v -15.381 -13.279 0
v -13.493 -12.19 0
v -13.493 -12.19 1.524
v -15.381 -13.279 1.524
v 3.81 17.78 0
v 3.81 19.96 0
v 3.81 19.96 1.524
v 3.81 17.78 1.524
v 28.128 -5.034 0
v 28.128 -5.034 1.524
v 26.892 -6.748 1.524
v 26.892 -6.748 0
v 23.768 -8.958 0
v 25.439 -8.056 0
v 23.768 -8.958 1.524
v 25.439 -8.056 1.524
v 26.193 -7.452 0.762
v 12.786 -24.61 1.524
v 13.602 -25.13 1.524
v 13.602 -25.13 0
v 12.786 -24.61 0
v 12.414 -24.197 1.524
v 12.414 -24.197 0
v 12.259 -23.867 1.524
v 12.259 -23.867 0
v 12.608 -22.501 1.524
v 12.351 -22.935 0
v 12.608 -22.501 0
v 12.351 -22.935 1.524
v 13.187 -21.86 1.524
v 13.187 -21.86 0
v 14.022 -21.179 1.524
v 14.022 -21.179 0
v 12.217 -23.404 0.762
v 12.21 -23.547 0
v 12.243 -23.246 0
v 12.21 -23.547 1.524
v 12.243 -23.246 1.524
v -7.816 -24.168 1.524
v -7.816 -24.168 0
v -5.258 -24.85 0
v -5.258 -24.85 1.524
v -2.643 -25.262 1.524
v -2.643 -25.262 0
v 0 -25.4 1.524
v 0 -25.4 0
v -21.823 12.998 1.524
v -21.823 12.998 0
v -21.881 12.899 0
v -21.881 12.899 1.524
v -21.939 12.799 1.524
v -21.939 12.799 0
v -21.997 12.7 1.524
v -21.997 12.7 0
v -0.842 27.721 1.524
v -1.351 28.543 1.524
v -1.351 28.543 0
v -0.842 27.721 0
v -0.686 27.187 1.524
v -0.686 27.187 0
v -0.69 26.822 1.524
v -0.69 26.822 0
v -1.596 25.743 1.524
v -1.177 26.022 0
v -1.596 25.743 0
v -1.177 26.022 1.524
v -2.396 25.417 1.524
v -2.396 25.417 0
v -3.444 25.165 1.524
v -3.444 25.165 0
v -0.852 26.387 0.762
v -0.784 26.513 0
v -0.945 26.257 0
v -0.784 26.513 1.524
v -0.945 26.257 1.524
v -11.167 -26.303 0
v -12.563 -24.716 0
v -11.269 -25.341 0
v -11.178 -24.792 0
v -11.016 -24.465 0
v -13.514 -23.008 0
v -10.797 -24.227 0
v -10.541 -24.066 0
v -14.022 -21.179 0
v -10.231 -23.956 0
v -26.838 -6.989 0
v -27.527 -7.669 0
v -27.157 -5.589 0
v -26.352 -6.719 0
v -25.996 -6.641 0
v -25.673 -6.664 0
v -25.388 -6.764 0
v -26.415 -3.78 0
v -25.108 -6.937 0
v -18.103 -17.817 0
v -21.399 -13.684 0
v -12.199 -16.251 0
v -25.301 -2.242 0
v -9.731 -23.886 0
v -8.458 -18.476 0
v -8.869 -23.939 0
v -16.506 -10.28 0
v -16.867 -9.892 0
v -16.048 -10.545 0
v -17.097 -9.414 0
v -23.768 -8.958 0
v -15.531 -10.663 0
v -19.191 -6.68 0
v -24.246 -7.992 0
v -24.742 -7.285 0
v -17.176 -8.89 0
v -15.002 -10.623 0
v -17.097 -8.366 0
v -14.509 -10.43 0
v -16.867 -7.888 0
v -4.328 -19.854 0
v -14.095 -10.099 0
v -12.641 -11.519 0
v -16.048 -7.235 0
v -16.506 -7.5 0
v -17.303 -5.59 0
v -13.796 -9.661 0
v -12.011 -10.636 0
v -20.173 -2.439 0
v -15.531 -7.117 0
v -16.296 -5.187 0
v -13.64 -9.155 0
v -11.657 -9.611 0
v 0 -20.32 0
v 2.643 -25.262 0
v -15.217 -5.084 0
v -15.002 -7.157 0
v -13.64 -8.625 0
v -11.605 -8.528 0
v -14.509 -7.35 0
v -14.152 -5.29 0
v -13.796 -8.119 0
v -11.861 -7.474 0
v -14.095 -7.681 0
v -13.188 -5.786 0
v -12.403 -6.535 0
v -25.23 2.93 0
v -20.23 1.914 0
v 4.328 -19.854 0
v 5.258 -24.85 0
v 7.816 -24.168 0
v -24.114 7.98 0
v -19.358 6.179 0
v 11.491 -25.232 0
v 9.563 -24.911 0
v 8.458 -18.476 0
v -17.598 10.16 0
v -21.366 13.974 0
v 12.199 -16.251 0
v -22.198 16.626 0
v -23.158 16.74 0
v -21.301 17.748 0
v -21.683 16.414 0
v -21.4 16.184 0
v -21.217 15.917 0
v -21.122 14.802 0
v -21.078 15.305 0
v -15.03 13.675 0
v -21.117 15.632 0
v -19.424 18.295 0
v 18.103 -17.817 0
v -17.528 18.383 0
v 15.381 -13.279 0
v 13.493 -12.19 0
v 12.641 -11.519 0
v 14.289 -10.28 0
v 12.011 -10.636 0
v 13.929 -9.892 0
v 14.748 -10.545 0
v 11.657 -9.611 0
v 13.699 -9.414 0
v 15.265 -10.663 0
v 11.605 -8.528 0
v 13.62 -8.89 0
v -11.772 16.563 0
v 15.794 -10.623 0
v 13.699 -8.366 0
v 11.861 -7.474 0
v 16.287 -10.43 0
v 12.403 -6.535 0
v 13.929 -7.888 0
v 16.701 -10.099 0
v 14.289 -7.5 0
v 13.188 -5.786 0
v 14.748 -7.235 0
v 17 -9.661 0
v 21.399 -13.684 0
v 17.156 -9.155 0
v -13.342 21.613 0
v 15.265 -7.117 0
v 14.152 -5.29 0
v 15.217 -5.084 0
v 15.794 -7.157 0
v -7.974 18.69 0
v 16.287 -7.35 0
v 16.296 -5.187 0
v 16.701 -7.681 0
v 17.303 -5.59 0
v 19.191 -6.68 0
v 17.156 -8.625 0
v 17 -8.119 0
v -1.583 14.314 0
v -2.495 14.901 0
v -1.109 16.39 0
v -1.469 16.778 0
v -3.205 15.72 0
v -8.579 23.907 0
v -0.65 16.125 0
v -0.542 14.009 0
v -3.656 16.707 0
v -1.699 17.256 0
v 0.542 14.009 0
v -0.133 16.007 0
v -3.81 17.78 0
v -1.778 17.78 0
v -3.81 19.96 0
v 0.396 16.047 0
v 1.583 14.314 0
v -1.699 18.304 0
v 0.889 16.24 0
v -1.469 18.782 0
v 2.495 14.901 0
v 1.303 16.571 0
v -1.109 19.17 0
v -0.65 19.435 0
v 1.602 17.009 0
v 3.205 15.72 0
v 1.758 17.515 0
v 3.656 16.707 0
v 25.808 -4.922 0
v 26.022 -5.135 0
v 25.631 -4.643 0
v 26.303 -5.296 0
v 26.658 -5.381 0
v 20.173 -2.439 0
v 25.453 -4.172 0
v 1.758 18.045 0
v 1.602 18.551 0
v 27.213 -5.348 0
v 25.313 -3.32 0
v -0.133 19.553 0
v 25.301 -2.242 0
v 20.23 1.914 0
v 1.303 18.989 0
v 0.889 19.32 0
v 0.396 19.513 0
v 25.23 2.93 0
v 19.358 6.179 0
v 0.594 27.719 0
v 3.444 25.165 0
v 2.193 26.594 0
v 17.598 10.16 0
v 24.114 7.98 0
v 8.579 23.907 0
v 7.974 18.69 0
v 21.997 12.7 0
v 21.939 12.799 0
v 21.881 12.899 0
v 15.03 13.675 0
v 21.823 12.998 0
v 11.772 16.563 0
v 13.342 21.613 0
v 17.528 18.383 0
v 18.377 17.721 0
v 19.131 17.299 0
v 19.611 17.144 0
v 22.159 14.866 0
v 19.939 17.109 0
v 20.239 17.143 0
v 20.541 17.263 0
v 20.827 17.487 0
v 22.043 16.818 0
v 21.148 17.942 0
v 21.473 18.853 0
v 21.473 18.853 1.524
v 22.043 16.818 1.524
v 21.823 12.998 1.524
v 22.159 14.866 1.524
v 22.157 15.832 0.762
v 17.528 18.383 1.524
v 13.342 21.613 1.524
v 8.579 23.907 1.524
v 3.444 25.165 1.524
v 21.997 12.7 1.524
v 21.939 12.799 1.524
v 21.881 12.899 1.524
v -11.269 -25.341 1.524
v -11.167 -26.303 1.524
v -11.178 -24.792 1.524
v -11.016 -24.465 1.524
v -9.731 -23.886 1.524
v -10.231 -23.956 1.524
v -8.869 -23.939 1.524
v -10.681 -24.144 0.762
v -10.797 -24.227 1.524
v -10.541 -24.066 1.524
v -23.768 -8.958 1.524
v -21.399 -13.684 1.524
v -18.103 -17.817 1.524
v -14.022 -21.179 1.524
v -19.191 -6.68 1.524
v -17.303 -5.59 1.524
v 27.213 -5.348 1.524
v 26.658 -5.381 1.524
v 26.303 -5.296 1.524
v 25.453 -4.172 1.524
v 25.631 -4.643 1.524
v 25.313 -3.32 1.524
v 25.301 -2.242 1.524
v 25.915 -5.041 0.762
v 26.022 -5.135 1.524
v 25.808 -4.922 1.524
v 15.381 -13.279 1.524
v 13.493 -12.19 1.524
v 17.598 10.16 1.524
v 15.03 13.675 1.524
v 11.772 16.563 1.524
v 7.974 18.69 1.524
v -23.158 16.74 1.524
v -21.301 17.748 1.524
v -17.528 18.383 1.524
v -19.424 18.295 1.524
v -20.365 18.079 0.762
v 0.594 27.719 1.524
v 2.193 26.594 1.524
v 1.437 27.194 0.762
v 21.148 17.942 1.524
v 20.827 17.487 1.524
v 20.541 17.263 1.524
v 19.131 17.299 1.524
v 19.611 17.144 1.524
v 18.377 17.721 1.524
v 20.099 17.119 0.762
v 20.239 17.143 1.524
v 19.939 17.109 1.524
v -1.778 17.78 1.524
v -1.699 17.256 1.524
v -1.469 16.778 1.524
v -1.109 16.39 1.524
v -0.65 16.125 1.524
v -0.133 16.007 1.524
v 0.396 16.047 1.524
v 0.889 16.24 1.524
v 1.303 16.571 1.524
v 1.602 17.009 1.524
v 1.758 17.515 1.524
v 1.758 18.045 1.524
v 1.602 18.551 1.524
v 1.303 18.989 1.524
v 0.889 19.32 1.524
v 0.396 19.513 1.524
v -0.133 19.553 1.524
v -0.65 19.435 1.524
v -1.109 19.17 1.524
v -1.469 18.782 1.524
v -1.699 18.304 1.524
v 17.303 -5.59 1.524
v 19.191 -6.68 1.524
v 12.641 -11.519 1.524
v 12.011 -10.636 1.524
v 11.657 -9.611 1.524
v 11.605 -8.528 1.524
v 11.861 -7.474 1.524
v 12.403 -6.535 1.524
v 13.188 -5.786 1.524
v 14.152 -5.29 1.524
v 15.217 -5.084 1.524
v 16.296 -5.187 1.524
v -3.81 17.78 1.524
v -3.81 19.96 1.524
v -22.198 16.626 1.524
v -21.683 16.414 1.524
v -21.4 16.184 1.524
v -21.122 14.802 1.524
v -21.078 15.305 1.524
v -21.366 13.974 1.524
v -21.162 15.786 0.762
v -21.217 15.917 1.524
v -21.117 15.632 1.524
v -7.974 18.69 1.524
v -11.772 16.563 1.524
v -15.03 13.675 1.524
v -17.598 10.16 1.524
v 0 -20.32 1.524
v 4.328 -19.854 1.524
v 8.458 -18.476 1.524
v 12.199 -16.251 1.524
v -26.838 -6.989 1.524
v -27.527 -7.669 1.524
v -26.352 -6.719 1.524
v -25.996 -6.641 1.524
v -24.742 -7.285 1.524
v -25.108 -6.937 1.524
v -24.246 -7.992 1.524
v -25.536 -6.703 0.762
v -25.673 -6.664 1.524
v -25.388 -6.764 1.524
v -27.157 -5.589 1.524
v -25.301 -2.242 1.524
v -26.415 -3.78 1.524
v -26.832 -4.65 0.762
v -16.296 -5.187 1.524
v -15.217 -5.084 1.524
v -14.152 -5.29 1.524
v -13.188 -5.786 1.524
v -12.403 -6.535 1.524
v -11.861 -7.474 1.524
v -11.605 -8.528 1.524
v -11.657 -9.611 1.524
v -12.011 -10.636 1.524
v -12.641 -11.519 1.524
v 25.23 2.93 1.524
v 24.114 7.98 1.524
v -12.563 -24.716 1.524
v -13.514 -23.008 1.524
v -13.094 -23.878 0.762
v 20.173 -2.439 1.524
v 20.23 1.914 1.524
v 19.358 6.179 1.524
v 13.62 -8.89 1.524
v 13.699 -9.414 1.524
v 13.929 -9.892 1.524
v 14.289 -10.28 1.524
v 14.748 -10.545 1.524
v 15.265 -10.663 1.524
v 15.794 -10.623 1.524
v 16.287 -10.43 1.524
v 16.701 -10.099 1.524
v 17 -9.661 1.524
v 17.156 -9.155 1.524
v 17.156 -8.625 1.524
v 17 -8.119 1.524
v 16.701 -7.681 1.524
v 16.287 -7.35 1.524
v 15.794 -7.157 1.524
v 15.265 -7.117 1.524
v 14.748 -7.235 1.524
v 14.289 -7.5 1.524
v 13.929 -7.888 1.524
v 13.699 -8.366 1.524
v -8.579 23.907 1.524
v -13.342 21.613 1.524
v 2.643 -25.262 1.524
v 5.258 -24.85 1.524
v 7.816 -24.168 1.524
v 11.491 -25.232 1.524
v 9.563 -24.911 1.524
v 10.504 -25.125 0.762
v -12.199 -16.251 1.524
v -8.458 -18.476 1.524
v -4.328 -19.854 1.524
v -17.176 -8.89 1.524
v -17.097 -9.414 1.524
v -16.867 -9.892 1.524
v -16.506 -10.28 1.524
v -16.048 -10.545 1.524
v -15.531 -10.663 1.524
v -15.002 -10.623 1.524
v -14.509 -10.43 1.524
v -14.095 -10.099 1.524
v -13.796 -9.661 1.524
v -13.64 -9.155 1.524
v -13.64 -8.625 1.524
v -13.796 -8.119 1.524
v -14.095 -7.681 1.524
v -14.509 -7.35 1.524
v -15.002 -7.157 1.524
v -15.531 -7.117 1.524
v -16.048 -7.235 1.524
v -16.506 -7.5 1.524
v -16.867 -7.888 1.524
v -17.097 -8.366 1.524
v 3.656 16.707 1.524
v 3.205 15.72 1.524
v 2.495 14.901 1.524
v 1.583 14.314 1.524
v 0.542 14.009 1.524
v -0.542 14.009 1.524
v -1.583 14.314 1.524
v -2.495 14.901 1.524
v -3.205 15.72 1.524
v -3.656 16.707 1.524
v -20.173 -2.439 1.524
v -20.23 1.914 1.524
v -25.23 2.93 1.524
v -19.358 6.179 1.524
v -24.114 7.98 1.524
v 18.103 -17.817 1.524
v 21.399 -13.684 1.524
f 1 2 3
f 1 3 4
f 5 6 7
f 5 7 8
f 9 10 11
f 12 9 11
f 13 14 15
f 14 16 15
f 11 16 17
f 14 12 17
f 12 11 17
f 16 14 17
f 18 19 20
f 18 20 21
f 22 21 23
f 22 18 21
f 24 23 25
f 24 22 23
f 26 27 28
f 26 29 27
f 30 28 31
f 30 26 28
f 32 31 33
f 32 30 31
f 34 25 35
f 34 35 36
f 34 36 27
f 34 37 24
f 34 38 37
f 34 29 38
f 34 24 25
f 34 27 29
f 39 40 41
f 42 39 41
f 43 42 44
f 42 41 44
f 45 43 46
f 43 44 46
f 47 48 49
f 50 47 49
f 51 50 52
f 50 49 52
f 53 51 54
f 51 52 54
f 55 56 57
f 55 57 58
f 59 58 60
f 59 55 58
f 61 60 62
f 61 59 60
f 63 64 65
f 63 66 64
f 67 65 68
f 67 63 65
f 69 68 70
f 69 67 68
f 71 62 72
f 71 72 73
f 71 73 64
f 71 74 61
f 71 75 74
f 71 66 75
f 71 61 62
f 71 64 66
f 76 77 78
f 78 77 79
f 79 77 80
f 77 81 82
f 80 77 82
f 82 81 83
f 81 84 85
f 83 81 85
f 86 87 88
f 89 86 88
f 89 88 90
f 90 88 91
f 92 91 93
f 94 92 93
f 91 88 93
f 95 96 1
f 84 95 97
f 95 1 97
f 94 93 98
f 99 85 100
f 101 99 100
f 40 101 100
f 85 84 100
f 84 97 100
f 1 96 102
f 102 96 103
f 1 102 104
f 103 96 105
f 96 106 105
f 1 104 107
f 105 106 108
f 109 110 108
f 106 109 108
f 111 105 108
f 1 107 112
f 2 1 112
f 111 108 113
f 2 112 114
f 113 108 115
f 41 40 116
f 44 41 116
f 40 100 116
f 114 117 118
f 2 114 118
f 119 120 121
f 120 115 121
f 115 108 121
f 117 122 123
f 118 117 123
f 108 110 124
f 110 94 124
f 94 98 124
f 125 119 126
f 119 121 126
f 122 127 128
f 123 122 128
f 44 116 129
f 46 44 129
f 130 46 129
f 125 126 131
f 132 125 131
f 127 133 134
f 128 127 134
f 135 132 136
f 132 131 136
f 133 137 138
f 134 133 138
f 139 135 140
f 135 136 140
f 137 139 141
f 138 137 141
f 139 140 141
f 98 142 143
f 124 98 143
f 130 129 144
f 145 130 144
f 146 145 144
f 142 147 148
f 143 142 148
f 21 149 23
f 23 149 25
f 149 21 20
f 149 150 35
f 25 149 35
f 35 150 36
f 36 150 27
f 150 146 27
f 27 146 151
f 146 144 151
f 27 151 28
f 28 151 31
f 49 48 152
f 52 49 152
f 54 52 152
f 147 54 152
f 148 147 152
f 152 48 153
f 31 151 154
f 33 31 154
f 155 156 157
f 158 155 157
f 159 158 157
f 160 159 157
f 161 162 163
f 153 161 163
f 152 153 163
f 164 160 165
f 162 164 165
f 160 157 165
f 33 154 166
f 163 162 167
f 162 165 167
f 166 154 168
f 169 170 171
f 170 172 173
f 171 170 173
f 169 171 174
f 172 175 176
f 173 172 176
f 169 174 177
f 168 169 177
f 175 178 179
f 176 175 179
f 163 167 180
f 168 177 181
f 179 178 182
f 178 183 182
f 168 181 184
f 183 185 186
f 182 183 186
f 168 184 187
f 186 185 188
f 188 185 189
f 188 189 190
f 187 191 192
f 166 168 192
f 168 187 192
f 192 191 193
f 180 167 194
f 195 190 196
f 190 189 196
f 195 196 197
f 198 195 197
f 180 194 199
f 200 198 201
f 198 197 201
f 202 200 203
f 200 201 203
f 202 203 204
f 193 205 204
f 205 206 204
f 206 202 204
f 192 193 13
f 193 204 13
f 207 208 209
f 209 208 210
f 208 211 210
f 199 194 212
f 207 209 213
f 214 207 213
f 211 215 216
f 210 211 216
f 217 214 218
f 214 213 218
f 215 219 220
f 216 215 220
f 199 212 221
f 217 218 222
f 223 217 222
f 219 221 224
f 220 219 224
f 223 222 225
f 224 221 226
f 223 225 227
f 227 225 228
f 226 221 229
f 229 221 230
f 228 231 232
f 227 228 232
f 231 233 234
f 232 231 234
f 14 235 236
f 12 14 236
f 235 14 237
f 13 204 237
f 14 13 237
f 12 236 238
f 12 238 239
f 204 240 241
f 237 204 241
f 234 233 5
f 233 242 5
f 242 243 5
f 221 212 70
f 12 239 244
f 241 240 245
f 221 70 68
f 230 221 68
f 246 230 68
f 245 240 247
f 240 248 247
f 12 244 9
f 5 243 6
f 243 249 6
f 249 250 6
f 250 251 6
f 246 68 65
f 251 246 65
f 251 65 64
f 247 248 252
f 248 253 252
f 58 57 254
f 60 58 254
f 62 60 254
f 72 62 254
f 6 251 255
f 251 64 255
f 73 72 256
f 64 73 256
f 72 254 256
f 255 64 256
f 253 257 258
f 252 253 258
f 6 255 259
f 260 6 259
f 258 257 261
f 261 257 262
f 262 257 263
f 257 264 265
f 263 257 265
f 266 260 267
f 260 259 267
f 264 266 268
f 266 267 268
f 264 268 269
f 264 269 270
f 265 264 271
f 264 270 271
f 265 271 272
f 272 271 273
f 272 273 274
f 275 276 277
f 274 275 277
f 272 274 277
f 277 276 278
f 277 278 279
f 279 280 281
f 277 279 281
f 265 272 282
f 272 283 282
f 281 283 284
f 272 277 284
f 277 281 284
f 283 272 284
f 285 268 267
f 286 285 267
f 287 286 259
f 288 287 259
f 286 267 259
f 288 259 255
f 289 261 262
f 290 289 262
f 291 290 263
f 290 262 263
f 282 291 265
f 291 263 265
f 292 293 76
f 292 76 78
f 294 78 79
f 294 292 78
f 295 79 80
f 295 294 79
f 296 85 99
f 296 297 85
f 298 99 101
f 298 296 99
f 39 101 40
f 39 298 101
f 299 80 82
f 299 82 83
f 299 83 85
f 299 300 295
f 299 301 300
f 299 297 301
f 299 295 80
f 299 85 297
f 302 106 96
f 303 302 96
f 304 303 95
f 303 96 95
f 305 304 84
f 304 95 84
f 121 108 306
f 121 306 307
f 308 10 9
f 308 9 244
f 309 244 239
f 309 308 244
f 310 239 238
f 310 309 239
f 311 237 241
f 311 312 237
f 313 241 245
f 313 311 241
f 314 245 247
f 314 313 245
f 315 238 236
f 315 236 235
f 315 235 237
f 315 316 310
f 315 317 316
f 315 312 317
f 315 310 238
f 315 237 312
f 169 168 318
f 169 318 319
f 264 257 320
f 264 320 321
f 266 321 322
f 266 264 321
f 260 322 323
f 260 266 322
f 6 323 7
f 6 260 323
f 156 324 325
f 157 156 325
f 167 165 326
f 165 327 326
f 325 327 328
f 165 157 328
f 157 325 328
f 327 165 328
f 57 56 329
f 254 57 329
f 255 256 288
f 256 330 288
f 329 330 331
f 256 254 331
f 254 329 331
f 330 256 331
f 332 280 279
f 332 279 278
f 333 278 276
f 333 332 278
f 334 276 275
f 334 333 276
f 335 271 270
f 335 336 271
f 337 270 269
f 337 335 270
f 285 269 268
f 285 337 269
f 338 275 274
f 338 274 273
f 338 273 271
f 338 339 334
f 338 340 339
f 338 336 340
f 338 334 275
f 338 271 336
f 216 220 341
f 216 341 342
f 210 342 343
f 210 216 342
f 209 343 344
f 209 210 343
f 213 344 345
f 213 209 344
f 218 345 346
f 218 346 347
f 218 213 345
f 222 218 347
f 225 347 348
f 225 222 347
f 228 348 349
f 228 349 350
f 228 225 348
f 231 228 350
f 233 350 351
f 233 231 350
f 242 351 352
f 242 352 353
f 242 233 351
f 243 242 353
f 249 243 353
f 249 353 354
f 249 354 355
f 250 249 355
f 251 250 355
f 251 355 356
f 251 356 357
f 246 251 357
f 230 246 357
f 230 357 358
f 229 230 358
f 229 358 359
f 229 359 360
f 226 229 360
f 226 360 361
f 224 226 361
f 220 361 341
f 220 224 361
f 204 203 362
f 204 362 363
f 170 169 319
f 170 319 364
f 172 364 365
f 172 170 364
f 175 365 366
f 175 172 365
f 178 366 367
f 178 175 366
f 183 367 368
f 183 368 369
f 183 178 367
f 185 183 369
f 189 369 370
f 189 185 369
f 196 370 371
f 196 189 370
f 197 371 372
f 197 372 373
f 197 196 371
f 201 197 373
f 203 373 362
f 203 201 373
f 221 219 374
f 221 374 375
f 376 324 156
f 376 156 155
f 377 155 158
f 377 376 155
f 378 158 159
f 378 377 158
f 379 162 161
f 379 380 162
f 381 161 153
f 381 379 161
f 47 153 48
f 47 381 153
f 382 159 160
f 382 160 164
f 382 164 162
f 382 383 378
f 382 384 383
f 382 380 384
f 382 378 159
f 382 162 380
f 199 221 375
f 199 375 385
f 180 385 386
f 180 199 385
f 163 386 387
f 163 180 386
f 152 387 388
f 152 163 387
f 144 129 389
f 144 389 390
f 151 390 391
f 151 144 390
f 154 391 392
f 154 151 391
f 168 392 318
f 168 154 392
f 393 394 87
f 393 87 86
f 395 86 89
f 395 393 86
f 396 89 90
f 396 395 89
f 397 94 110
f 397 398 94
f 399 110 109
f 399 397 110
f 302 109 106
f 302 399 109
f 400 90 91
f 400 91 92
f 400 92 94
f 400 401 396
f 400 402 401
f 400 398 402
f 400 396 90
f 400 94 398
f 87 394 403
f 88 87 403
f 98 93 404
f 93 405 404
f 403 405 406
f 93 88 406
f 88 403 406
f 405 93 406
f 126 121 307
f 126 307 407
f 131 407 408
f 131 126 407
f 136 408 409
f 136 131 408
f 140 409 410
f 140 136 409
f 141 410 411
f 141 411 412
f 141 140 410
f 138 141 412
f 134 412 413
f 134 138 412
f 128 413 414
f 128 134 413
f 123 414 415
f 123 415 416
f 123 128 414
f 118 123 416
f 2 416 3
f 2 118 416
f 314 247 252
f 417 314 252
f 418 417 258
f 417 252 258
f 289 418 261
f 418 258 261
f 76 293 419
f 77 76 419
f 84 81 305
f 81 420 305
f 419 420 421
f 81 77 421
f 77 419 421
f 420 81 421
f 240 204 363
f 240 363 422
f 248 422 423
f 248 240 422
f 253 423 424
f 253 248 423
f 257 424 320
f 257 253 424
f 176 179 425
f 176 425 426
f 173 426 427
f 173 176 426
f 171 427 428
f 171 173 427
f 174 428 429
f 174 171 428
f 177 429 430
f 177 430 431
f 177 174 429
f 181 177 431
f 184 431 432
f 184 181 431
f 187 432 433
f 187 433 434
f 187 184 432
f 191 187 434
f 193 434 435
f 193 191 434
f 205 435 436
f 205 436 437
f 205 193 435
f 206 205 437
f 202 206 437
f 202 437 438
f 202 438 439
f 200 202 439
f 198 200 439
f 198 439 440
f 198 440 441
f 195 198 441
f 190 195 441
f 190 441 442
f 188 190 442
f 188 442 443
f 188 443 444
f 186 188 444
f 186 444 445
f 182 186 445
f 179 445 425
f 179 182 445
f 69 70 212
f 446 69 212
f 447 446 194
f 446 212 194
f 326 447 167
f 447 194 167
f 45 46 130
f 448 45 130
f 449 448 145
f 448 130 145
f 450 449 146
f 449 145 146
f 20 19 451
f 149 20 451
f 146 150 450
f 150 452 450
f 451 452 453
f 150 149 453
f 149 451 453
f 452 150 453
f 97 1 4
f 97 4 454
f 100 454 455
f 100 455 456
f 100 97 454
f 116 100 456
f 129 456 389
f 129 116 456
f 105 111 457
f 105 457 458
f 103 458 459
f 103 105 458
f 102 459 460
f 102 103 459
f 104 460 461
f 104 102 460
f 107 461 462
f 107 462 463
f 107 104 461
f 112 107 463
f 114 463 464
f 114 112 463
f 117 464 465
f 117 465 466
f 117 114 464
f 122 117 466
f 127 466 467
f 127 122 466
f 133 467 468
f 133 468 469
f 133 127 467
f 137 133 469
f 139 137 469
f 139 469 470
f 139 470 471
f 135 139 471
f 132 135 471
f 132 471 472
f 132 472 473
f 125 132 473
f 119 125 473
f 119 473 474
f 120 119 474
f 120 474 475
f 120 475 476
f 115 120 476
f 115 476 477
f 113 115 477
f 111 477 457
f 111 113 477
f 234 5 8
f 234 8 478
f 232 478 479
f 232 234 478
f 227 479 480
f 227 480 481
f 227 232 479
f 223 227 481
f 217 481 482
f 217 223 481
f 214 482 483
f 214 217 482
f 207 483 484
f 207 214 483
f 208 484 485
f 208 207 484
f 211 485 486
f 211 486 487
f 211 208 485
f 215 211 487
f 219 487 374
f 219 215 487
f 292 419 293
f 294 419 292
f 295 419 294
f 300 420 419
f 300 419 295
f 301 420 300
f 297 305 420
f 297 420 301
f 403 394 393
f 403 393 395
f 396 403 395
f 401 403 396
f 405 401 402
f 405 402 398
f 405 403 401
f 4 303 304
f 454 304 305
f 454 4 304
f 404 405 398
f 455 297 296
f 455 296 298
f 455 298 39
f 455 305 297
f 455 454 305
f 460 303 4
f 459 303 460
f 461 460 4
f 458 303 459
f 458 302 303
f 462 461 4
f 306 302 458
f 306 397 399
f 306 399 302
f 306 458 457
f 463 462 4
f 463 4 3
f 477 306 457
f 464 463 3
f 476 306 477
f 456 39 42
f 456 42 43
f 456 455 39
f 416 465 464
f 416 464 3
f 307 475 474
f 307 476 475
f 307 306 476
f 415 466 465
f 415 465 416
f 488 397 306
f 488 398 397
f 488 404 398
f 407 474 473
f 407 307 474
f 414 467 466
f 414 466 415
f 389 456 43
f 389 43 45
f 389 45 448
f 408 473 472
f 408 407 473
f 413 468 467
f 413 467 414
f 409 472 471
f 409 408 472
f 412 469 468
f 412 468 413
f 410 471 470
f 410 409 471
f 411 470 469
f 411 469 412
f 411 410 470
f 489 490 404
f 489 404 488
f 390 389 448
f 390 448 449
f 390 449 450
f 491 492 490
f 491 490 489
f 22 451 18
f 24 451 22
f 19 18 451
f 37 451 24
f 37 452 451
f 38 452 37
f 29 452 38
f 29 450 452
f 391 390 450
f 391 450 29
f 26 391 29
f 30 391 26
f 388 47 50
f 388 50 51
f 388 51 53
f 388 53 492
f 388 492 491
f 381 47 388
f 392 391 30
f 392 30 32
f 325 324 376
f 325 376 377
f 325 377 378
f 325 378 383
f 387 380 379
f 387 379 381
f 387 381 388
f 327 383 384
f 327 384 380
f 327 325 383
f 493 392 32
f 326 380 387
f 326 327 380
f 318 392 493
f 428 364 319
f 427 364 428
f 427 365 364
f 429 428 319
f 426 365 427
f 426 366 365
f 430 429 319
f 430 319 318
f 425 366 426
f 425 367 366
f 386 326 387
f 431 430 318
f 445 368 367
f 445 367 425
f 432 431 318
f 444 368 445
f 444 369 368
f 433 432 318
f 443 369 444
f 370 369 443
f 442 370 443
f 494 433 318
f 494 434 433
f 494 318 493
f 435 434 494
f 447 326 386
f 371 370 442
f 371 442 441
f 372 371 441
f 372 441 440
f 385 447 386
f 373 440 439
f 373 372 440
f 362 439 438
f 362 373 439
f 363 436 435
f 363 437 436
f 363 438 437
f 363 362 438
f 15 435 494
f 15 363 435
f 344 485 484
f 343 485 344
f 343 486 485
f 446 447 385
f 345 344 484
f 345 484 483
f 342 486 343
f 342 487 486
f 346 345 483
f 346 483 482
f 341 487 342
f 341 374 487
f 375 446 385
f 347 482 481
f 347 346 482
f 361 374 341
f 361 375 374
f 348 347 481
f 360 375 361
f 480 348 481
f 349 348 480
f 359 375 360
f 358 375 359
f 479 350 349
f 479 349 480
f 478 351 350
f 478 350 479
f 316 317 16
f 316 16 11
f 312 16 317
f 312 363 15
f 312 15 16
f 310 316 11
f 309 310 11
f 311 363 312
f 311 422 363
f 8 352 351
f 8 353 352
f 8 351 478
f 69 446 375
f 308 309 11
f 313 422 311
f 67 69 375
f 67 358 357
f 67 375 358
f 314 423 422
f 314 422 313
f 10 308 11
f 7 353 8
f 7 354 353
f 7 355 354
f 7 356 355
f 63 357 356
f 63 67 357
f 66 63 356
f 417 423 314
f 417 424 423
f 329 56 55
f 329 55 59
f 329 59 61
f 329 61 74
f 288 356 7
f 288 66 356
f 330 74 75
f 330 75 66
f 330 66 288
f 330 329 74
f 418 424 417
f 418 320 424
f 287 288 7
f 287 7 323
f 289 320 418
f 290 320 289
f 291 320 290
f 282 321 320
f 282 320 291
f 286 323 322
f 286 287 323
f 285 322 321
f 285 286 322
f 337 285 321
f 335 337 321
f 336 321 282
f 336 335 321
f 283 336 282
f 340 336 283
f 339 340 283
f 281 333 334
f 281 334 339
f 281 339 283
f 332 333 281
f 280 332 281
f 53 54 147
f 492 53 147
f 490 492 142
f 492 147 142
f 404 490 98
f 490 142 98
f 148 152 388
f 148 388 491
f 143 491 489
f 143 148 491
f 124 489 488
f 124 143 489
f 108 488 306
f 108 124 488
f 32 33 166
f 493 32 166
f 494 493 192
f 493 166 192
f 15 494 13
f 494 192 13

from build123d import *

# Parameters (mm, degrees)
SKETCH1_R           = 1.778
BOSS_EXTRUDE1_DEPTH = 1.524
BOSS_EXTRUDE2_DEPTH = 1.524


with BuildPart() as part:
    # Sketch1 → Boss-Extrude1 (new body)
    with BuildSketch(Plane.XY):
        with BuildLine():
            ThreePointArc((21.997045256, 12.7), (0, 25.4), (-21.997045256, 12.7))
            ThreePointArc((-21.997045256, 12.7), (-21.997045256, -12.7), (0, -25.4))
            ThreePointArc((0, -25.4), (21.997045256, -12.7), (21.997045256, 12.7))
        make_face()
        with Locations(Location((0, 17.78, 0), (0, 0, 180))):
            Circle(SKETCH1_R, mode=Mode.SUBTRACT)
        with Locations(Location((15.397931679, -8.89, 0), (0, 0, 180))):
            Circle(SKETCH1_R, mode=Mode.SUBTRACT)
        with Locations(Location((-15.397931679, -8.89, 0), (0, 0, 180))):
            Circle(SKETCH1_R, mode=Mode.SUBTRACT)
        with BuildLine():
            Line((-3.81, 17.78), (-3.81, 19.95961673))
            ThreePointArc((-3.81, 19.95961673), (-11.771994053, 16.562685652), (-17.597636205, 10.16))
            ThreePointArc((-17.597636205, 10.16), (-20.229703556, 1.913503077), (-19.190535138, -6.680251576))
            Line((-19.190535138, -6.680251576), (-17.302931679, -5.590443212))
            ThreePointArc((-17.302931679, -5.590443212), (-12.098374891, -6.985), (-13.492931679, -12.189556788))
            Line((-13.492931679, -12.189556788), (-15.380535138, -13.279365153))
            ThreePointArc((-15.380535138, -13.279365153), (-8.457709503, -18.476188729), (0, -20.32))
            ThreePointArc((0, -20.32), (8.457709503, -18.476188729), (15.380535138, -13.279365153))
            Line((15.380535138, -13.279365153), (13.492931679, -12.189556788))
            ThreePointArc((13.492931679, -12.189556788), (12.098374891, -6.985), (17.302931679, -5.590443212))
            Line((17.302931679, -5.590443212), (19.190535138, -6.680251576))
            ThreePointArc((19.190535138, -6.680251576), (20.229703556, 1.913503077), (17.597636205, 10.16))
            ThreePointArc((17.597636205, 10.16), (11.771994053, 16.562685652), (3.81, 19.95961673))
            Line((3.81, 19.95961673), (3.81, 17.78))
            ThreePointArc((3.81, 17.78), (0, 13.97), (-3.81, 17.78))
        make_face(mode=Mode.SUBTRACT)
    extrude(amount=BOSS_EXTRUDE1_DEPTH)

    # Sketch2 → Boss-Extrude2 (add)
    with BuildSketch(Plane.XY.offset(1.524)):
        with BuildLine():
            Line((-3.444175737, 25.165405888), (4.388245609, 23.329352482))
            add(Edge.make_bspline(
                [(-1.351467981, 28.543022953), (2.94701041, 27.179254576), (4.388245609, 23.329352482)],
                knots=[0, 0, 0, 1, 1, 1], degree=2))
            add(Edge.make_bspline(
                [(-1.351467981, 28.543022953), (0.693484877, 25.920519128), (-3.444175737, 25.165405888)],
                knots=[0, 0, 0, 1, 1, 1], degree=2))
        make_face()
        with BuildLine():
            Line((17.527698145, 18.383138953), (20.975648621, 11.114744787))
            add(Edge.make_bspline(
                [(21.473207446, 18.852903941), (23.087027834, 14.641922533), (20.975648621, 11.114744787)],
                knots=[0, 0, 0, 1, 1, 1], degree=2))
            add(Edge.make_bspline(
                [(21.473207446, 18.852903941), (20.697858644, 15.618991025), (17.527698145, 18.383138953)],
                knots=[0, 0, 0, 1, 1, 1], degree=2))
        make_face()
        with BuildLine():
            Line((25.300857823, -2.242006562), (21.767960397, -9.469492432))
            add(Edge.make_bspline(
                [(28.128119692, -5.033836268), (25.84204241, -8.921075819), (21.767960397, -9.469492432)],
                knots=[0, 0, 0, 1, 1, 1], degree=2))
            add(Edge.make_bspline(
                [(28.128119692, -5.033836268), (25.116322693, -6.443955888), (25.300857823, -2.242006562)],
                knots=[0, 0, 0, 1, 1, 1], degree=2))
        make_face()
        with BuildLine():
            Line((14.021955517, -21.178875406), (6.168554008, -22.923008708))
            add(Edge.make_bspline(
                [(13.601984102, -25.129995095), (9.137471969, -25.766322122), (6.168554008, -22.923008708)],
                knots=[0, 0, 0, 1, 1, 1], degree=2))
            add(Edge.make_bspline(
                [(13.601984102, -25.129995095), (10.621683474, -23.654472585), (14.021955517, -21.178875406)],
                knots=[0, 0, 0, 1, 1, 1], degree=2))
        make_face()
        with BuildLine():
            Line((-7.815765289, -24.1676191), (-14.075899364, -19.115031882))
            add(Edge.make_bspline(
                [(-11.166722947, -26.302755058), (-14.447801235, -23.20900233), (-14.075899364, -19.115031882)],
                knots=[0, 0, 0, 1, 1, 1], degree=2))
            add(Edge.make_bspline(
                [(-11.166722947, -26.302755058), (-11.871300044, -23.052688962), (-7.815765289, -24.1676191)],
                knots=[0, 0, 0, 1, 1, 1], degree=2))
        make_face()
        with BuildLine():
            Line((-23.76805542, -8.957652682), (-23.72091342, -0.913046174))
            add(Edge.make_bspline(
                [(-27.526659857, -7.669003983), (-27.153585428, -3.174830406), (-23.72091342, -0.913046174)],
                knots=[0, 0, 0, 1, 1, 1], degree=2))
            add(Edge.make_bspline(
                [(-27.526659857, -7.669003983), (-25.424952498, -5.091760362), (-23.76805542, -8.957652682)],
                knots=[0, 0, 0, 1, 1, 1], degree=2))
        make_face()
        with BuildLine():
            Line((-21.82251504, 12.997608909), (-15.503595851, 17.976481926))
            add(Edge.make_bspline(
                [(-23.158460453, 16.73966351), (-19.412165961, 19.250053568), (-15.503595851, 17.976481926)],
                knots=[0, 0, 0, 1, 1, 1], degree=2))
            add(Edge.make_bspline(
                [(-23.158460453, 16.73966351), (-19.833097147, 16.703367644), (-21.82251504, 12.997608909)],
                knots=[0, 0, 0, 1, 1, 1], degree=2))
        make_face()
    extrude(amount=-BOSS_EXTRUDE2_DEPTH)


solid = part.part
